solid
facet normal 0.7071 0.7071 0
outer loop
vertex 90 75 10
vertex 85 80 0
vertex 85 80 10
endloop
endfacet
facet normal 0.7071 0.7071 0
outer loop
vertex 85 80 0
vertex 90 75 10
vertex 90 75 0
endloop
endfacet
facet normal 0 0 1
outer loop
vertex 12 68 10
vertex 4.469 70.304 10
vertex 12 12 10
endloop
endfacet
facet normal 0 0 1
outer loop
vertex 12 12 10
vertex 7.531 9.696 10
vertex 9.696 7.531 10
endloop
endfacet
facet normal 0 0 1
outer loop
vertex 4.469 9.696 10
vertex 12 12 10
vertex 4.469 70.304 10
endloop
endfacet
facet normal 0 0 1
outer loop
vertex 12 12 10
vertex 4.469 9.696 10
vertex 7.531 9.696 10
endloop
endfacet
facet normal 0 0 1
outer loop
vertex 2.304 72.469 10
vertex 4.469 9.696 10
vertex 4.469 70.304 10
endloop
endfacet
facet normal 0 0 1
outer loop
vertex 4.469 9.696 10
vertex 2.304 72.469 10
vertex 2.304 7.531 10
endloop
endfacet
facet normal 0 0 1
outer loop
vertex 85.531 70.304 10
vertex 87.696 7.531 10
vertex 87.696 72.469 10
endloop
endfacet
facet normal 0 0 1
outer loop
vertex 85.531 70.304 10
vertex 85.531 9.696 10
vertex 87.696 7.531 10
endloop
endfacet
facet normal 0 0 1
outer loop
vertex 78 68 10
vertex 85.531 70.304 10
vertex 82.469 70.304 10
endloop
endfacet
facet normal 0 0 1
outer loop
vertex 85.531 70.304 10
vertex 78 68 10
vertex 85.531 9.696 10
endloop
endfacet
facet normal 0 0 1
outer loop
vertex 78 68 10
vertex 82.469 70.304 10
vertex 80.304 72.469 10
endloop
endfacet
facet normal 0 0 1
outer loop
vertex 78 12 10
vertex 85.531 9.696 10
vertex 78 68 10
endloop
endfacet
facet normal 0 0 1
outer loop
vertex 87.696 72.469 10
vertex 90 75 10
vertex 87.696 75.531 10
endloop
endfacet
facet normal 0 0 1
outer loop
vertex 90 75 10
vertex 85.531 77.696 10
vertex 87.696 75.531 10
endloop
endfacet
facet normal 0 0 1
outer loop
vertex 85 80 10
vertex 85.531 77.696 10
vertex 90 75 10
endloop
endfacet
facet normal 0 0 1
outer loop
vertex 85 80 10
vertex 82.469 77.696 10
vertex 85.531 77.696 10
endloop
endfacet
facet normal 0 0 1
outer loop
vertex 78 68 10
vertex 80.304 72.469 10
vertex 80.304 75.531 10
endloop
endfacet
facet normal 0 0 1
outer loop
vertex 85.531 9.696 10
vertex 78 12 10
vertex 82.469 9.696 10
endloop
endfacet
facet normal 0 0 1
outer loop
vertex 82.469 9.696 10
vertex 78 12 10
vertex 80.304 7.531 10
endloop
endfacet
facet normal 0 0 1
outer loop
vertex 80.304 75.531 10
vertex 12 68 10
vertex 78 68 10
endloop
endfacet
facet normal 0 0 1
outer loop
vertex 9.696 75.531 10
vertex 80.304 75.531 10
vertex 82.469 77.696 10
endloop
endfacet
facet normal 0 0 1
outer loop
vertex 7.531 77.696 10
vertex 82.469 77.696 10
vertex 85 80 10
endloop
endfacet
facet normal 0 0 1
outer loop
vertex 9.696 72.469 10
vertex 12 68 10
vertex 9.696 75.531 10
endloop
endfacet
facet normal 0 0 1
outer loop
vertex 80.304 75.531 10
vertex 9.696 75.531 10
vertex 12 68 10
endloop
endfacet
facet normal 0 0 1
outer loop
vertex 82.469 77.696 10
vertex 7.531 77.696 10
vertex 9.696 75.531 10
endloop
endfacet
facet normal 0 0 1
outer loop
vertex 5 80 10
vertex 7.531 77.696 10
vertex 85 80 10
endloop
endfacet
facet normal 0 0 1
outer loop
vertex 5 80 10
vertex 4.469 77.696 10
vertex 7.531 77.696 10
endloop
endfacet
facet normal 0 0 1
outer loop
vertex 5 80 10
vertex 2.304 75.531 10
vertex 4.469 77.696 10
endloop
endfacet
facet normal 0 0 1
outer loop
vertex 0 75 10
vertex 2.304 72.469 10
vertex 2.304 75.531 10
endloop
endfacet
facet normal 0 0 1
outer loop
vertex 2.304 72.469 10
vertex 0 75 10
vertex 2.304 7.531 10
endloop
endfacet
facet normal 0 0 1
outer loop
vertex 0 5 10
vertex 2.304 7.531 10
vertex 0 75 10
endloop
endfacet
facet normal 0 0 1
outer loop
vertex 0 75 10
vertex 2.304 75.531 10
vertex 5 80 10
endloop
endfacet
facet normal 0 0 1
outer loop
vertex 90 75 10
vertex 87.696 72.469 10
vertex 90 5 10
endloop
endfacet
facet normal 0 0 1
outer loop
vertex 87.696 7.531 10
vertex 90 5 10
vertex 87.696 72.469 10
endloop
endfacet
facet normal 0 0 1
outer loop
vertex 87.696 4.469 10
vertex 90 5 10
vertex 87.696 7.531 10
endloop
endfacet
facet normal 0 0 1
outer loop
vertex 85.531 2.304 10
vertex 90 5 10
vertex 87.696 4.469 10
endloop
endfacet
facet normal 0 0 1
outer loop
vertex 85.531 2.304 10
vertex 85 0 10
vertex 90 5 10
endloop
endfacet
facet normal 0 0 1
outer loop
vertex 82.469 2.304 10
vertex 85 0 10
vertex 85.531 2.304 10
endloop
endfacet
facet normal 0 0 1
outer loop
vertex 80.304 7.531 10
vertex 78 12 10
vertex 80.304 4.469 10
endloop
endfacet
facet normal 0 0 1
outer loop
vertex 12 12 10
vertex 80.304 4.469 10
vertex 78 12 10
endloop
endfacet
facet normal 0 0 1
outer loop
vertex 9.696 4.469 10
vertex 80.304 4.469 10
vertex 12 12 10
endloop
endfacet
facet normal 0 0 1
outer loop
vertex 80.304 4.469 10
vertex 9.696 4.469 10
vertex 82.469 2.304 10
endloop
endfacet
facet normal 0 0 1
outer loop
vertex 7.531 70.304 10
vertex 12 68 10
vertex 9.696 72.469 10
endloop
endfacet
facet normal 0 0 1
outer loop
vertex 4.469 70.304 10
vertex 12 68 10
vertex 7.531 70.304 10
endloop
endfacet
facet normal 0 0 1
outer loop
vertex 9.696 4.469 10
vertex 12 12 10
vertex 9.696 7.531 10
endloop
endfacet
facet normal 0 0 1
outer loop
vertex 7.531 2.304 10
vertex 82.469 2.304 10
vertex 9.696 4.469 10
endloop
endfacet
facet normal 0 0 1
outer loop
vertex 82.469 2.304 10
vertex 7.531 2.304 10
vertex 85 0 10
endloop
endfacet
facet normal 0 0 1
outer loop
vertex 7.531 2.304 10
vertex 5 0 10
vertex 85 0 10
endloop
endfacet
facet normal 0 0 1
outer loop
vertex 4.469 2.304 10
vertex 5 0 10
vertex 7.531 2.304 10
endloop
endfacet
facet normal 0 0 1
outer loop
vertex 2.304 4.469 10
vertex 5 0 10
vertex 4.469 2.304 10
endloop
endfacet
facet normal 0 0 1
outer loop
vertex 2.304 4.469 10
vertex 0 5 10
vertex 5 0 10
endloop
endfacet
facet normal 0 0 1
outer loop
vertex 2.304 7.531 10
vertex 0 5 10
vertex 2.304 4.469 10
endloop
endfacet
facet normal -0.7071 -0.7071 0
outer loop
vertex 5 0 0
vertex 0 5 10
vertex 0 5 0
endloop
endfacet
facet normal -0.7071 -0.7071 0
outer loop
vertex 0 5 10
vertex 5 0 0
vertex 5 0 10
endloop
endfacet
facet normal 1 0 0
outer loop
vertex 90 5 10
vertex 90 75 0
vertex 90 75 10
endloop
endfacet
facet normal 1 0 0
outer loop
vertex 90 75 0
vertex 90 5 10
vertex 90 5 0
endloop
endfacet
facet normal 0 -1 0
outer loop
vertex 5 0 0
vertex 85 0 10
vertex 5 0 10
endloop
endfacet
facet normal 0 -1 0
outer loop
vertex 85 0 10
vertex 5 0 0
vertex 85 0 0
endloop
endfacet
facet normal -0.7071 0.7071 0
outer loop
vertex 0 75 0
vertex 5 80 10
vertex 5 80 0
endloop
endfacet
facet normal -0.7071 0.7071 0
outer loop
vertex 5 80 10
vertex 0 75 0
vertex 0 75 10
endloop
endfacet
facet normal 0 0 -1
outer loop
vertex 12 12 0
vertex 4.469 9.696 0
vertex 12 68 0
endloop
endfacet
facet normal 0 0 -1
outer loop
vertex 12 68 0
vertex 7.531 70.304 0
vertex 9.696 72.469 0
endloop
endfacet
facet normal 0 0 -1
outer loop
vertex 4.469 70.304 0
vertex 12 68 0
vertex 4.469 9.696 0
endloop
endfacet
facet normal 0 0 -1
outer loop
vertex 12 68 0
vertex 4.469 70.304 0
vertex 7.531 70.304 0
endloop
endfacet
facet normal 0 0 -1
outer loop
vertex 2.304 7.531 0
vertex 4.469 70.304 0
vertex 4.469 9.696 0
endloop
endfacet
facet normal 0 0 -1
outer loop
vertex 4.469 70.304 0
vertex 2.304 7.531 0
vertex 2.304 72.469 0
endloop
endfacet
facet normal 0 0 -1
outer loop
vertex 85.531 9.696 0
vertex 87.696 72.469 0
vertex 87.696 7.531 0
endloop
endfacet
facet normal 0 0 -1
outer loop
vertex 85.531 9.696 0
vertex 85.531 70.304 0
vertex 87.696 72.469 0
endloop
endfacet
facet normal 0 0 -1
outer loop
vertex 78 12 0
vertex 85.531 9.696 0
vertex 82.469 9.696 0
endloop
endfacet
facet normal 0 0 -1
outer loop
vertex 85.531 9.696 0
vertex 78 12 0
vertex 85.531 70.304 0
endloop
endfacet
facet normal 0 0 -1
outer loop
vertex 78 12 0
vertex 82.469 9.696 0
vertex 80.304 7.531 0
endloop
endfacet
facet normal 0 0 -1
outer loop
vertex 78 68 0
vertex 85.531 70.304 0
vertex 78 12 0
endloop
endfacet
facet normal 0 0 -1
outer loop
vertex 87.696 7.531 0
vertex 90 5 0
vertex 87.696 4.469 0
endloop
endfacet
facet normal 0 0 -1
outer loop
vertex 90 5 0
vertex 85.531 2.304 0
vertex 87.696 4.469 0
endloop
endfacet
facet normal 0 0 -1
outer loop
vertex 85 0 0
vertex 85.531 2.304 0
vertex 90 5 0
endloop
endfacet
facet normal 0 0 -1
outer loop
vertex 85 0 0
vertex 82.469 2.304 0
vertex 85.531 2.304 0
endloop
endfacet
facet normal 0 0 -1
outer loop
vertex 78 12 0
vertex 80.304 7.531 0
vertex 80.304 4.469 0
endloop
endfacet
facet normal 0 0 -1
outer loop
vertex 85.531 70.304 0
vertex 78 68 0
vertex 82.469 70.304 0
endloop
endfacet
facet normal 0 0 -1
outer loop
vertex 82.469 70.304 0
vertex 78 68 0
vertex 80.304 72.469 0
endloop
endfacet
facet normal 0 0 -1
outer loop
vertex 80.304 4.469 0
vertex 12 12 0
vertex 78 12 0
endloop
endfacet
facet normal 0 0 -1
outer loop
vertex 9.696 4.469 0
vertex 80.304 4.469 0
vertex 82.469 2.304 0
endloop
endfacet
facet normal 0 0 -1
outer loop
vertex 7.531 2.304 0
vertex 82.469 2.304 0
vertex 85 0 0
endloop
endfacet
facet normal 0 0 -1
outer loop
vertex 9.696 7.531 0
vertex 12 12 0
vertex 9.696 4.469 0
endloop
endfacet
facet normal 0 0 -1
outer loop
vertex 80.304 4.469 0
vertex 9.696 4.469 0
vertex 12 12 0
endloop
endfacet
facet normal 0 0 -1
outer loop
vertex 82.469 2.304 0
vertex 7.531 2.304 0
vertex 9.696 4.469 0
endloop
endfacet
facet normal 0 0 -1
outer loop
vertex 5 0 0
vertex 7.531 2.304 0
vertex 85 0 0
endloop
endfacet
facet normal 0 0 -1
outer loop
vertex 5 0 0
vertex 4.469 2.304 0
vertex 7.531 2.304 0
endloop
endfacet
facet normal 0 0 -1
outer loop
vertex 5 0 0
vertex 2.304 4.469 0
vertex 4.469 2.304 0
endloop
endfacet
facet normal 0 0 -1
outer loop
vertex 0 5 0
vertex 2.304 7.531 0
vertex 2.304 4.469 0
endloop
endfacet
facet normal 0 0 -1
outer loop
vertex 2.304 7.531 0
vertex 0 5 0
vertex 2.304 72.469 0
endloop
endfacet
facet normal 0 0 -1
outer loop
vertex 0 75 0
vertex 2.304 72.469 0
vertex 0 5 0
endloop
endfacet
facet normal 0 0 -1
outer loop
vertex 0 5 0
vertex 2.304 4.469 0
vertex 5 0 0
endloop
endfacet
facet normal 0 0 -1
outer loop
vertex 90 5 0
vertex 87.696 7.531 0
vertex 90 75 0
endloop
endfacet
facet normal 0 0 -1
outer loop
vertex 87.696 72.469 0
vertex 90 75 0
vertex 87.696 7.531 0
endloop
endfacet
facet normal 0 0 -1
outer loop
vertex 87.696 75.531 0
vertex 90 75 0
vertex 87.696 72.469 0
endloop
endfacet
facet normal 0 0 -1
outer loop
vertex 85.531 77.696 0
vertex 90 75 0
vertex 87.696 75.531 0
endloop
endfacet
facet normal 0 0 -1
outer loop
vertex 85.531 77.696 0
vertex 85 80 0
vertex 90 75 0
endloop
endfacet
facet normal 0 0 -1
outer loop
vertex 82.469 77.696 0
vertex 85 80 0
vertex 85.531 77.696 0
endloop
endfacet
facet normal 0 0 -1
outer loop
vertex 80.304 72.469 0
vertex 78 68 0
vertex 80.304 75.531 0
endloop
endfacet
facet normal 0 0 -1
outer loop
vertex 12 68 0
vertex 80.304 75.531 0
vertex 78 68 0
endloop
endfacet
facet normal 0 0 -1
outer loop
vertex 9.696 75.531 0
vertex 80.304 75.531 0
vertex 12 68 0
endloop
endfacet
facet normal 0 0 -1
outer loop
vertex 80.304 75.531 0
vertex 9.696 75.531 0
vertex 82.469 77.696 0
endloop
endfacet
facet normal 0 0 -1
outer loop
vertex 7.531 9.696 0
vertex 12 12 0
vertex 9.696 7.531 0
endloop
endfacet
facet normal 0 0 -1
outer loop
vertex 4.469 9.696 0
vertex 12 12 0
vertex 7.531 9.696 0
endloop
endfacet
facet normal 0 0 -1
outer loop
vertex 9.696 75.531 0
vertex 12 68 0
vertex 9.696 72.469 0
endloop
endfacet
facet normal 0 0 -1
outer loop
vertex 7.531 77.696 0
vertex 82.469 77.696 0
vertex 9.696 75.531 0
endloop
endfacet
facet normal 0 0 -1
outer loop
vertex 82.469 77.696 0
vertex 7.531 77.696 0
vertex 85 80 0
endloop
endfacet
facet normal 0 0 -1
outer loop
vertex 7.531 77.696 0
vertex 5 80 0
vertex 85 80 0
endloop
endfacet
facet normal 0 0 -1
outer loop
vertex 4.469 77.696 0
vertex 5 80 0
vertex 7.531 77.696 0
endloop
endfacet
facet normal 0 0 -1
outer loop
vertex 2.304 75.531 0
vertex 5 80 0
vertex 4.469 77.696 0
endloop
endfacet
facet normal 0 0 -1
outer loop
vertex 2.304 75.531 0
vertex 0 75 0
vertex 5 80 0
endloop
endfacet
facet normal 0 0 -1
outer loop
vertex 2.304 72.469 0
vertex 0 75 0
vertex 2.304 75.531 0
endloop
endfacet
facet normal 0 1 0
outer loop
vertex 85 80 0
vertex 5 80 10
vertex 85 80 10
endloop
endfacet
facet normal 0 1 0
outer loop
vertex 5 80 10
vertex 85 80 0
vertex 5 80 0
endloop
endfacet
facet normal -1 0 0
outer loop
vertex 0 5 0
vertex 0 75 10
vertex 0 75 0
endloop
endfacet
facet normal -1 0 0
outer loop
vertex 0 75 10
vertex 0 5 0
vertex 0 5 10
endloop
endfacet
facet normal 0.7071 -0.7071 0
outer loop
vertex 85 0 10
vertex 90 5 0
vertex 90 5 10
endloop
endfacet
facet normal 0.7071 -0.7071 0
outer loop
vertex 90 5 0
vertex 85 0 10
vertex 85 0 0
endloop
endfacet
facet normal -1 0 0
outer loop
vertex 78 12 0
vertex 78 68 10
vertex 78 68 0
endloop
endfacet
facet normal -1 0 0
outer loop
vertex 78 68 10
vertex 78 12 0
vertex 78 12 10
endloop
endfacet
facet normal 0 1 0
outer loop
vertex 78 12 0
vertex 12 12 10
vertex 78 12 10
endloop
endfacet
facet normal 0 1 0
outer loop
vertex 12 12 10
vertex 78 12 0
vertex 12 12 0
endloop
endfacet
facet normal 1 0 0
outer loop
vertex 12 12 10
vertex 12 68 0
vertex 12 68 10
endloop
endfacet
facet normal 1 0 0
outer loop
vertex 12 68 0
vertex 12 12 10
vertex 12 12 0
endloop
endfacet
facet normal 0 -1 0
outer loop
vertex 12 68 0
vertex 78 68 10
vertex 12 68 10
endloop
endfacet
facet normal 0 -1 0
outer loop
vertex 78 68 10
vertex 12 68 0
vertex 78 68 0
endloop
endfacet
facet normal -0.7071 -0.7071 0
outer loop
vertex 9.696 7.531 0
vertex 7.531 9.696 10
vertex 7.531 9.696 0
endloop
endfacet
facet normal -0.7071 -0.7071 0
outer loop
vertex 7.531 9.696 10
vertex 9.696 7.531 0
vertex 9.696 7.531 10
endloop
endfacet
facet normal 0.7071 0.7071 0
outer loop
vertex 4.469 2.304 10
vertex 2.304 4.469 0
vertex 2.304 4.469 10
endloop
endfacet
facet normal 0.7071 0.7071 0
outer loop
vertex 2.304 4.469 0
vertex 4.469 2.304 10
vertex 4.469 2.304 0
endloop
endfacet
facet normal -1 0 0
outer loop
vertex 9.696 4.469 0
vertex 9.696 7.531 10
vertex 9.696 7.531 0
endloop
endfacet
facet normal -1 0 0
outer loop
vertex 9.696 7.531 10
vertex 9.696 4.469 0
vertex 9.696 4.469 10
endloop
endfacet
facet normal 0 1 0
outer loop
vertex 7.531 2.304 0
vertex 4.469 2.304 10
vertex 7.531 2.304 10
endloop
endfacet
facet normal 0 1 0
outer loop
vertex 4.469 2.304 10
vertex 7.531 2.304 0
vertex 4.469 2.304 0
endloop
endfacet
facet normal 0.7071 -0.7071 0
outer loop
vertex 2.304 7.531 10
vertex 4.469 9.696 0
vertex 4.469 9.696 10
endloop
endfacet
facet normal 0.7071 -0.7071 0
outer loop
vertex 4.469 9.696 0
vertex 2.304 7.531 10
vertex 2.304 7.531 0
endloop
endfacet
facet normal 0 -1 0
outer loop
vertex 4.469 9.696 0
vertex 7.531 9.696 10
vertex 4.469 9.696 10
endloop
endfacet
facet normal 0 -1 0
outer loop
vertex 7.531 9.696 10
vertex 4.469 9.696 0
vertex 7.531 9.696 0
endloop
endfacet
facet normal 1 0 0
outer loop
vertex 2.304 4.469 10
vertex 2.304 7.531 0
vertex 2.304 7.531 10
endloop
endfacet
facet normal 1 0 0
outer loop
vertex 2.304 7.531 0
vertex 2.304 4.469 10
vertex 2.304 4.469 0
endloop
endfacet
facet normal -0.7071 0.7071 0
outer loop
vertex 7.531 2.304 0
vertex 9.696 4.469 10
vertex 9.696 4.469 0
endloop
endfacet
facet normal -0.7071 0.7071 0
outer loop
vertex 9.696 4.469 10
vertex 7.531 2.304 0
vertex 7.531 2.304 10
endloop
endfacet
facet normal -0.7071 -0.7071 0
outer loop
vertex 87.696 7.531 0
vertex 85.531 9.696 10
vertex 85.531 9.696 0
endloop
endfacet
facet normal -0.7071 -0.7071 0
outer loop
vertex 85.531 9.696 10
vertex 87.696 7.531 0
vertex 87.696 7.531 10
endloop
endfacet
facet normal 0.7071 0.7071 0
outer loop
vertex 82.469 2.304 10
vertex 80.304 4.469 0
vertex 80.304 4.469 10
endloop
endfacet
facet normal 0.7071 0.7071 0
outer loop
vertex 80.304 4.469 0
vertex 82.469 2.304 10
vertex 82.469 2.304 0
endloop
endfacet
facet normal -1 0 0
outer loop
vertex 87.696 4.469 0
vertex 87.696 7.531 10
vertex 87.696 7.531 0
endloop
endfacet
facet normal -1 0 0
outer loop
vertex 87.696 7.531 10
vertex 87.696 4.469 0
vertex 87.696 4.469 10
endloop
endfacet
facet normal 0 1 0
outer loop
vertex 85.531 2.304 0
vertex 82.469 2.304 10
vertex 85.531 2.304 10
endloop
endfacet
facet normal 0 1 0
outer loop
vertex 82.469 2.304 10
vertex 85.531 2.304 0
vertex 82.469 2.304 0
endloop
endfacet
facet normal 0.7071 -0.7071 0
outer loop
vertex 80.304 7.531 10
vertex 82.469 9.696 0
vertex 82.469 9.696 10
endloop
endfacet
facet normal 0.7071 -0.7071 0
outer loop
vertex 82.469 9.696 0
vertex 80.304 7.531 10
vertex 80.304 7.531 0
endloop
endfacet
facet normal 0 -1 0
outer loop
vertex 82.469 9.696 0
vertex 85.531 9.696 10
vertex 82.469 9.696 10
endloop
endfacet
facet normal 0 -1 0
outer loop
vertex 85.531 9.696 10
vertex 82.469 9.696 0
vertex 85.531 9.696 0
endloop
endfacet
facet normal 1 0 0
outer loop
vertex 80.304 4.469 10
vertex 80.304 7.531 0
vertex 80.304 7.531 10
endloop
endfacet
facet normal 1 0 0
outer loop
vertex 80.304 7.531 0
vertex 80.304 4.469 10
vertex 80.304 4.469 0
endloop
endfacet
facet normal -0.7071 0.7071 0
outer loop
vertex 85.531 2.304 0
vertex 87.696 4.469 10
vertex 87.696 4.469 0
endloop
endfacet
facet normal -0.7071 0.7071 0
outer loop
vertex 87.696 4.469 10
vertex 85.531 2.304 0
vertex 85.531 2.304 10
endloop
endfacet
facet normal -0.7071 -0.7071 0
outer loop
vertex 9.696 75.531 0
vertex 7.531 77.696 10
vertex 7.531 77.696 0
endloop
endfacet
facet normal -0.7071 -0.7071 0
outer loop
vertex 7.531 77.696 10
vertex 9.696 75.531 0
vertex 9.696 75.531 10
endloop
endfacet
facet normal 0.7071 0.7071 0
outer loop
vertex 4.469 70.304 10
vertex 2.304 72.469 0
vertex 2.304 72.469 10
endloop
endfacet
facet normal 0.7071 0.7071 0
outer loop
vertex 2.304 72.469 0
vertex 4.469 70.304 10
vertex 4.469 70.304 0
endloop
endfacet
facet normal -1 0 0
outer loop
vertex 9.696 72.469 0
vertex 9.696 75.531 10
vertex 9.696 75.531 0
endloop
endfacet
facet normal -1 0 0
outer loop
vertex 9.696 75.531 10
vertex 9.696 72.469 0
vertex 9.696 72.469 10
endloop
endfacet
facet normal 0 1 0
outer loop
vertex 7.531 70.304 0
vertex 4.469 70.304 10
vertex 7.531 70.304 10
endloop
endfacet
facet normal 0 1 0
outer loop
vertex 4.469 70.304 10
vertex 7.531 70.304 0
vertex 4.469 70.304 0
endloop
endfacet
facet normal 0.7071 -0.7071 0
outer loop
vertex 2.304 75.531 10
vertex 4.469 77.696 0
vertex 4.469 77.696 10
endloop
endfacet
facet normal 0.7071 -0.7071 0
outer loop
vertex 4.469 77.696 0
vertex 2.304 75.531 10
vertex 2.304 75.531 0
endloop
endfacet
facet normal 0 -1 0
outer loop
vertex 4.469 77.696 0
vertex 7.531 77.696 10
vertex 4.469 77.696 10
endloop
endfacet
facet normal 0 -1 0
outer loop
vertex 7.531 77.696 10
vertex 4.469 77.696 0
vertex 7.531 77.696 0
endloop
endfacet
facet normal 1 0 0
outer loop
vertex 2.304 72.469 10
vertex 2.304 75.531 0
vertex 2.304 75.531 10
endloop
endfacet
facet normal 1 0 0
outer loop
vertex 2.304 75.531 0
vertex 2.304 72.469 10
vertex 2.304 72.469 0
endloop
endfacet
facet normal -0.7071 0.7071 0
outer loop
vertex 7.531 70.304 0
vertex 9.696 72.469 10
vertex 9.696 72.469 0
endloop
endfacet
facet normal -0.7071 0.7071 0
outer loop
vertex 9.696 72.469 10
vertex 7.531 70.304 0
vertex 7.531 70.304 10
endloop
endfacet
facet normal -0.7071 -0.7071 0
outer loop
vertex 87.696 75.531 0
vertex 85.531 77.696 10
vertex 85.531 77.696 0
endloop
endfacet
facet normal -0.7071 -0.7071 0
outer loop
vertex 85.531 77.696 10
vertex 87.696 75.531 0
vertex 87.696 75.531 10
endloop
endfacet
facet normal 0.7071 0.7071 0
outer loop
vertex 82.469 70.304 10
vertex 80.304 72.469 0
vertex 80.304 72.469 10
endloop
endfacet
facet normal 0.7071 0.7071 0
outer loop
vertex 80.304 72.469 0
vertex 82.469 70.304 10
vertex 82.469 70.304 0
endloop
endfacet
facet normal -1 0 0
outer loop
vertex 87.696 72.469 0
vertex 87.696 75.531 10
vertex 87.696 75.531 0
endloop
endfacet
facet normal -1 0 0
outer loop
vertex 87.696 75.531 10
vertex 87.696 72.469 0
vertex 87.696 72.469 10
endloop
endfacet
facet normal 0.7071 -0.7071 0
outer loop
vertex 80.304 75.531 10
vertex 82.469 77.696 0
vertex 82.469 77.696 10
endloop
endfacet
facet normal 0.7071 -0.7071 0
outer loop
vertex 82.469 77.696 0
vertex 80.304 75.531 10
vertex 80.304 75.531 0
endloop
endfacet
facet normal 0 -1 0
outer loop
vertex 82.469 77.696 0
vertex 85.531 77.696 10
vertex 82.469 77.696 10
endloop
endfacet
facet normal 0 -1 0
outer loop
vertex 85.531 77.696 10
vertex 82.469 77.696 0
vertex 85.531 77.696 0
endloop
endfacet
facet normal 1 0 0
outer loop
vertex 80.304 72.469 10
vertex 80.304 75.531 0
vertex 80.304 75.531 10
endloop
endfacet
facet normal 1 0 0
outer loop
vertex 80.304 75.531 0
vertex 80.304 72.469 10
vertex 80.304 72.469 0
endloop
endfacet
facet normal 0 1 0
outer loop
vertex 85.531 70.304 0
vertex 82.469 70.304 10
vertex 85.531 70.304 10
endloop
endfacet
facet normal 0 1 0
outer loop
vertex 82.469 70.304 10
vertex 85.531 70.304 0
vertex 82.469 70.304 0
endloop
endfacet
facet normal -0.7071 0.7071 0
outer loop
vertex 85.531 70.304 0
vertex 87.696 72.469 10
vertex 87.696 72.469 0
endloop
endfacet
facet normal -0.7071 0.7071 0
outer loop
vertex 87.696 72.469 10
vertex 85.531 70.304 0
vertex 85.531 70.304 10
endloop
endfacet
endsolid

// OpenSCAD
$fn = 32;

// ----------------------------------------------------------------------
// Frame plate: 90 x 80 frame, 12 mm rails
// ----------------------------------------------------------------------

// --- parameters (mm) ---
plate_l = 90;             // plate length, X
plate_w = 80;             // plate width, Y
plate_t = 10;             // plate thickness, Z (extrusion height)
corner_c = 5;             // corner chamfer
frame_bar = 12;           // frame rail width
bolt_r = 4;               // corner bolt window radius
bolt_inset = 6;           // bolt centre inset from the edges

win_l = plate_l - 2 * frame_bar;  // window length
win_w = plate_w - 2 * frame_bar;  // window width
bolt_d = 2 * bolt_r;  // corner hole diameter

profile = [[5, 0], [85, 0], [90, 5], [90, 75], [85, 80], [5, 80], [0, 75], [0, 5]];  // primary outline, 8 points, counter clockwise
void_1 = [[12, 12], [78, 12], [78, 68], [12, 68]];  // the window, 4 points
void_2 = [[9.696, 7.531], [7.531, 9.696], [4.469, 9.696], [2.304, 7.531], [2.304, 4.469], [4.469, 2.304], [7.531, 2.304], [9.696, 4.469]];  // corner bolt window, 8 points
void_3 = [[87.696, 7.531], [85.531, 9.696], [82.469, 9.696], [80.304, 7.531], [80.304, 4.469], [82.469, 2.304], [85.531, 2.304], [87.696, 4.469]];  // corner bolt window, 8 points
void_4 = [[9.696, 75.531], [7.531, 77.696], [4.469, 77.696], [2.304, 75.531], [2.304, 72.469], [4.469, 70.304], [7.531, 70.304], [9.696, 72.469]];  // corner bolt window, 8 points
void_5 = [[87.696, 75.531], [85.531, 77.696], [82.469, 77.696], [80.304, 75.531], [80.304, 72.469], [82.469, 70.304], [85.531, 70.304], [87.696, 72.469]];  // corner bolt window, 8 points

// --- the one profile operation ---
difference() {
  linear_extrude(height = plate_t) polygon(points = profile);
  translate([0, 0, -1])
    linear_extrude(height = plate_t + 2) polygon(points = void_1);
  translate([0, 0, -1])
    linear_extrude(height = plate_t + 2) polygon(points = void_2);
  translate([0, 0, -1])
    linear_extrude(height = plate_t + 2) polygon(points = void_3);
  translate([0, 0, -1])
    linear_extrude(height = plate_t + 2) polygon(points = void_4);
  translate([0, 0, -1])
    linear_extrude(height = plate_t + 2) polygon(points = void_5);
}
